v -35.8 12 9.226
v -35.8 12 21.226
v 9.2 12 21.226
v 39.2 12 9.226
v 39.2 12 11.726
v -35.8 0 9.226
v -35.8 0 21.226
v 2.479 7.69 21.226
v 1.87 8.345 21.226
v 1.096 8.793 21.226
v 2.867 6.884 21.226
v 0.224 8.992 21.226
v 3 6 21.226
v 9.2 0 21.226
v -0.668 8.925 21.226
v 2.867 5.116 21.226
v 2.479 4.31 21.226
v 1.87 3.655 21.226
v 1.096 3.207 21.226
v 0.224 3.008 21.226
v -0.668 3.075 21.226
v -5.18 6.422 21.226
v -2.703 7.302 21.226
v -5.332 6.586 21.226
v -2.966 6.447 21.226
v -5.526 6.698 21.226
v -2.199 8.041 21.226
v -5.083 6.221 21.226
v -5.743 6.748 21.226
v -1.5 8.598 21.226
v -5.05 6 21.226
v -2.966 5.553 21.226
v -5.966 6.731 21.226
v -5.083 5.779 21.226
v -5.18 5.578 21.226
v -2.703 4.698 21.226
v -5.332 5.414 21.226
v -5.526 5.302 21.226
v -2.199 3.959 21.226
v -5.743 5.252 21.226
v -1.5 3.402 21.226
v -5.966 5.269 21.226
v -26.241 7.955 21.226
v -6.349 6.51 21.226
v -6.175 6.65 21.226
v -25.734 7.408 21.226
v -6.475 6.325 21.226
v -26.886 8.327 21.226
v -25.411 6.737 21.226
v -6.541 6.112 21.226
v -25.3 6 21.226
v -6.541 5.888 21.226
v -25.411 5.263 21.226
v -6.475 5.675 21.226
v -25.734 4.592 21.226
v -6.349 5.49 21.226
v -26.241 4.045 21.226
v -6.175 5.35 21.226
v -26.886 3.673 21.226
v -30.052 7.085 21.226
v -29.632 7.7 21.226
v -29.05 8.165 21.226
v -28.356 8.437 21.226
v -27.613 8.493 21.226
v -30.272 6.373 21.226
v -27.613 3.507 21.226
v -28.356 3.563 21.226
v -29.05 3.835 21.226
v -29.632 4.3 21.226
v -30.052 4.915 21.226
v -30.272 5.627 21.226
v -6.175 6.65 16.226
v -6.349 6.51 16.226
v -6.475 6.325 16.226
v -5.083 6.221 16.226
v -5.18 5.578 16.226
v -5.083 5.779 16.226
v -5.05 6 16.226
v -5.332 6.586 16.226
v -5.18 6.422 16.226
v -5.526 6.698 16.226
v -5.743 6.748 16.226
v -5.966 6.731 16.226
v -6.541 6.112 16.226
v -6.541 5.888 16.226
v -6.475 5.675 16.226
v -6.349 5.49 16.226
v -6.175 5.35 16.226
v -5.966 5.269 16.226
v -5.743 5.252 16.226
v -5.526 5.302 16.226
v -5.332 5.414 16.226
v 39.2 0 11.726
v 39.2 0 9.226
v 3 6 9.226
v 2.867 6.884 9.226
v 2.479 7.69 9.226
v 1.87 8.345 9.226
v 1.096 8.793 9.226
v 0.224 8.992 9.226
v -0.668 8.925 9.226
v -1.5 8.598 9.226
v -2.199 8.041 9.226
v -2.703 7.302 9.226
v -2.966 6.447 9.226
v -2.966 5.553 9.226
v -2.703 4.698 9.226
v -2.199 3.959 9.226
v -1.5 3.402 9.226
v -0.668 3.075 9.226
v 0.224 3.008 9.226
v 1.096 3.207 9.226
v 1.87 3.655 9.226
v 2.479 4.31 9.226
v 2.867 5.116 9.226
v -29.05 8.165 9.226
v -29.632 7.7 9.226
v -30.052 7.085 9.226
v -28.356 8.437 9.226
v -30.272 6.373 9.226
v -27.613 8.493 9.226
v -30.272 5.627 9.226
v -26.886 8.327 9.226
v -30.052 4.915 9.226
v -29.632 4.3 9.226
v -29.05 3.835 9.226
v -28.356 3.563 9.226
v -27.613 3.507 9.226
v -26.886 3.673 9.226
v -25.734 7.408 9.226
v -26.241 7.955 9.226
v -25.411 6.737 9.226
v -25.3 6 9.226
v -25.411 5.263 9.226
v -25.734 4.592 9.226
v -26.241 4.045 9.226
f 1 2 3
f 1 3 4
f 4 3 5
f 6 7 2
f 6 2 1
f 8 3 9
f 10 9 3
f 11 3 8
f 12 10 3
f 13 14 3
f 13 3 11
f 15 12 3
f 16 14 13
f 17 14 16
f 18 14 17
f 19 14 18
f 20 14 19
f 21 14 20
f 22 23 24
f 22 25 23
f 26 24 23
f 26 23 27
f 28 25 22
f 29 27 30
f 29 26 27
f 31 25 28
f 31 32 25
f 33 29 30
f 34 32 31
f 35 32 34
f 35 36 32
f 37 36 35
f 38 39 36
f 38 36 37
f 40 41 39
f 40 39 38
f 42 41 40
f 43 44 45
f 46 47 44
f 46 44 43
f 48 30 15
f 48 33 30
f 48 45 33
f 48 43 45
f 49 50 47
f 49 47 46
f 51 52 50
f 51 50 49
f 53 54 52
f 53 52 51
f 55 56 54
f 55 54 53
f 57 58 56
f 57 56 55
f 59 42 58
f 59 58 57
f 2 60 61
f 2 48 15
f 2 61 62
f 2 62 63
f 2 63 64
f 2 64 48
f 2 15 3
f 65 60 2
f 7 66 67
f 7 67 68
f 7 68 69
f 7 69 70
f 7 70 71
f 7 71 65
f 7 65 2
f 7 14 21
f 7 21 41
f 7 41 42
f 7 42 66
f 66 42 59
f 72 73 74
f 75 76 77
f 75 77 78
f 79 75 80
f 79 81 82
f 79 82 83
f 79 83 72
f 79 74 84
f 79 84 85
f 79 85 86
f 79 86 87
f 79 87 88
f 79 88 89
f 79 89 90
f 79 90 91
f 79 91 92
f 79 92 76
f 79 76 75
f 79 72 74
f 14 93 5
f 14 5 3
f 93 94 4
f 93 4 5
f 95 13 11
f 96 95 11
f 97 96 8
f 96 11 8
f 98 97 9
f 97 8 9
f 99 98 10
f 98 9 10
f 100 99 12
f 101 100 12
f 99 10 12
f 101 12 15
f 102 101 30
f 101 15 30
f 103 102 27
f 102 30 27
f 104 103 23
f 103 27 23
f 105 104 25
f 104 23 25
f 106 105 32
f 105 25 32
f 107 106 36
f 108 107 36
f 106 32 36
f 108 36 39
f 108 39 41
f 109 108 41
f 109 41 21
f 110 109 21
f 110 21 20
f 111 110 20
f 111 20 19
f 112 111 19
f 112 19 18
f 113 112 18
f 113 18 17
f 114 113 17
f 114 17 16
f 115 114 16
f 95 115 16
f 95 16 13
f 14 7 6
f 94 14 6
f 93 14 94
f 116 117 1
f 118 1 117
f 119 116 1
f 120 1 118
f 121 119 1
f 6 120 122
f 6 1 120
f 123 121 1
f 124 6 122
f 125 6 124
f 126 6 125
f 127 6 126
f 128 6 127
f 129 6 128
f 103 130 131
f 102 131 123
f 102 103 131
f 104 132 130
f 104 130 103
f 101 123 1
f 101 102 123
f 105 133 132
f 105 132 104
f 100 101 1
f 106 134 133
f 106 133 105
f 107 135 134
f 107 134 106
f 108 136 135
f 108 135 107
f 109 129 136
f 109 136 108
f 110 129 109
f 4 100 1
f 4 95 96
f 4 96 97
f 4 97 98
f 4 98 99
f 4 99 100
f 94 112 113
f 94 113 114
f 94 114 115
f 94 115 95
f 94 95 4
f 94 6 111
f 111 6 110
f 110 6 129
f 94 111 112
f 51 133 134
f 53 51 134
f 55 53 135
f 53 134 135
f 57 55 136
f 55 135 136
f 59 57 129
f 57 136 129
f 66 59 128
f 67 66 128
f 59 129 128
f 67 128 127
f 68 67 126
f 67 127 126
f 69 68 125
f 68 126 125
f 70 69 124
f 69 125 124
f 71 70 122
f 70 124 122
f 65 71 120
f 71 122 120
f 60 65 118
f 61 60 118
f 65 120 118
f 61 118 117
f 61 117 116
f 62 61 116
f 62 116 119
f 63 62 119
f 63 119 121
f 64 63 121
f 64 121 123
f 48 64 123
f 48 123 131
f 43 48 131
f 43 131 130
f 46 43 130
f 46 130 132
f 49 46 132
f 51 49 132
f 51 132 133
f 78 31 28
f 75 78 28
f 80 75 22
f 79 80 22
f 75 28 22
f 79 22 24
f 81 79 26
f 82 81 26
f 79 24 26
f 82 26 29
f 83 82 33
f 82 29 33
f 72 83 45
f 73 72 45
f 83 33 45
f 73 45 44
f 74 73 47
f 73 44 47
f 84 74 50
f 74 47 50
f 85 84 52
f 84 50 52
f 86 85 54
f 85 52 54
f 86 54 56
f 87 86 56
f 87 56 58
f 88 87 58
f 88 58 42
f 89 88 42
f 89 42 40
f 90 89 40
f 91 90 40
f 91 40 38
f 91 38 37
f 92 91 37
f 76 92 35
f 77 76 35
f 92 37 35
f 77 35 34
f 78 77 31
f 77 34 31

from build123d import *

# Parameters (mm, degrees)
F1_DEPTH = 12
F2_R     = 3
F3_DEPTH = 12.001
F4_R     = 0.75
F5_DEPTH = 5
F6_R     = 2.5
F7_DEPTH = 12.001


with BuildPart() as f1:
    # F0 (on Front) → F1 (new body)
    with BuildSketch(Plane.XZ):
        Polygon((9.200479, 21.225578), (-35.799521, 21.225578), (-35.799521, 9.225578), (39.200479, 9.225578), (39.200479, 11.725578), align=None)
    extrude(amount=-F1_DEPTH)

    # F2 (on face) → F3 (cut, through all)
    with BuildSketch(Plane.XY.offset(21.225578)):
        with Locations((0, 6)):
            Circle(F2_R)
    extrude(amount=-F3_DEPTH, mode=Mode.SUBTRACT)

    # F4 (on face) → F5 (cut)
    with BuildSketch(Plane.XY.offset(21.225578)):
        with Locations((-5.799521, 6)):
            Circle(F4_R)
    extrude(amount=-F5_DEPTH, mode=Mode.SUBTRACT)

    # F6 (on face) → F7 (cut, through all)
    with BuildSketch(Plane(origin=(0, 0, 9.225578), x_dir=(1, 0, 0), z_dir=(0, 0, -1))):
        with Locations((-27.799521, -6)):
            Circle(F6_R)
    extrude(amount=-F7_DEPTH, mode=Mode.SUBTRACT)


solid = f1.part
